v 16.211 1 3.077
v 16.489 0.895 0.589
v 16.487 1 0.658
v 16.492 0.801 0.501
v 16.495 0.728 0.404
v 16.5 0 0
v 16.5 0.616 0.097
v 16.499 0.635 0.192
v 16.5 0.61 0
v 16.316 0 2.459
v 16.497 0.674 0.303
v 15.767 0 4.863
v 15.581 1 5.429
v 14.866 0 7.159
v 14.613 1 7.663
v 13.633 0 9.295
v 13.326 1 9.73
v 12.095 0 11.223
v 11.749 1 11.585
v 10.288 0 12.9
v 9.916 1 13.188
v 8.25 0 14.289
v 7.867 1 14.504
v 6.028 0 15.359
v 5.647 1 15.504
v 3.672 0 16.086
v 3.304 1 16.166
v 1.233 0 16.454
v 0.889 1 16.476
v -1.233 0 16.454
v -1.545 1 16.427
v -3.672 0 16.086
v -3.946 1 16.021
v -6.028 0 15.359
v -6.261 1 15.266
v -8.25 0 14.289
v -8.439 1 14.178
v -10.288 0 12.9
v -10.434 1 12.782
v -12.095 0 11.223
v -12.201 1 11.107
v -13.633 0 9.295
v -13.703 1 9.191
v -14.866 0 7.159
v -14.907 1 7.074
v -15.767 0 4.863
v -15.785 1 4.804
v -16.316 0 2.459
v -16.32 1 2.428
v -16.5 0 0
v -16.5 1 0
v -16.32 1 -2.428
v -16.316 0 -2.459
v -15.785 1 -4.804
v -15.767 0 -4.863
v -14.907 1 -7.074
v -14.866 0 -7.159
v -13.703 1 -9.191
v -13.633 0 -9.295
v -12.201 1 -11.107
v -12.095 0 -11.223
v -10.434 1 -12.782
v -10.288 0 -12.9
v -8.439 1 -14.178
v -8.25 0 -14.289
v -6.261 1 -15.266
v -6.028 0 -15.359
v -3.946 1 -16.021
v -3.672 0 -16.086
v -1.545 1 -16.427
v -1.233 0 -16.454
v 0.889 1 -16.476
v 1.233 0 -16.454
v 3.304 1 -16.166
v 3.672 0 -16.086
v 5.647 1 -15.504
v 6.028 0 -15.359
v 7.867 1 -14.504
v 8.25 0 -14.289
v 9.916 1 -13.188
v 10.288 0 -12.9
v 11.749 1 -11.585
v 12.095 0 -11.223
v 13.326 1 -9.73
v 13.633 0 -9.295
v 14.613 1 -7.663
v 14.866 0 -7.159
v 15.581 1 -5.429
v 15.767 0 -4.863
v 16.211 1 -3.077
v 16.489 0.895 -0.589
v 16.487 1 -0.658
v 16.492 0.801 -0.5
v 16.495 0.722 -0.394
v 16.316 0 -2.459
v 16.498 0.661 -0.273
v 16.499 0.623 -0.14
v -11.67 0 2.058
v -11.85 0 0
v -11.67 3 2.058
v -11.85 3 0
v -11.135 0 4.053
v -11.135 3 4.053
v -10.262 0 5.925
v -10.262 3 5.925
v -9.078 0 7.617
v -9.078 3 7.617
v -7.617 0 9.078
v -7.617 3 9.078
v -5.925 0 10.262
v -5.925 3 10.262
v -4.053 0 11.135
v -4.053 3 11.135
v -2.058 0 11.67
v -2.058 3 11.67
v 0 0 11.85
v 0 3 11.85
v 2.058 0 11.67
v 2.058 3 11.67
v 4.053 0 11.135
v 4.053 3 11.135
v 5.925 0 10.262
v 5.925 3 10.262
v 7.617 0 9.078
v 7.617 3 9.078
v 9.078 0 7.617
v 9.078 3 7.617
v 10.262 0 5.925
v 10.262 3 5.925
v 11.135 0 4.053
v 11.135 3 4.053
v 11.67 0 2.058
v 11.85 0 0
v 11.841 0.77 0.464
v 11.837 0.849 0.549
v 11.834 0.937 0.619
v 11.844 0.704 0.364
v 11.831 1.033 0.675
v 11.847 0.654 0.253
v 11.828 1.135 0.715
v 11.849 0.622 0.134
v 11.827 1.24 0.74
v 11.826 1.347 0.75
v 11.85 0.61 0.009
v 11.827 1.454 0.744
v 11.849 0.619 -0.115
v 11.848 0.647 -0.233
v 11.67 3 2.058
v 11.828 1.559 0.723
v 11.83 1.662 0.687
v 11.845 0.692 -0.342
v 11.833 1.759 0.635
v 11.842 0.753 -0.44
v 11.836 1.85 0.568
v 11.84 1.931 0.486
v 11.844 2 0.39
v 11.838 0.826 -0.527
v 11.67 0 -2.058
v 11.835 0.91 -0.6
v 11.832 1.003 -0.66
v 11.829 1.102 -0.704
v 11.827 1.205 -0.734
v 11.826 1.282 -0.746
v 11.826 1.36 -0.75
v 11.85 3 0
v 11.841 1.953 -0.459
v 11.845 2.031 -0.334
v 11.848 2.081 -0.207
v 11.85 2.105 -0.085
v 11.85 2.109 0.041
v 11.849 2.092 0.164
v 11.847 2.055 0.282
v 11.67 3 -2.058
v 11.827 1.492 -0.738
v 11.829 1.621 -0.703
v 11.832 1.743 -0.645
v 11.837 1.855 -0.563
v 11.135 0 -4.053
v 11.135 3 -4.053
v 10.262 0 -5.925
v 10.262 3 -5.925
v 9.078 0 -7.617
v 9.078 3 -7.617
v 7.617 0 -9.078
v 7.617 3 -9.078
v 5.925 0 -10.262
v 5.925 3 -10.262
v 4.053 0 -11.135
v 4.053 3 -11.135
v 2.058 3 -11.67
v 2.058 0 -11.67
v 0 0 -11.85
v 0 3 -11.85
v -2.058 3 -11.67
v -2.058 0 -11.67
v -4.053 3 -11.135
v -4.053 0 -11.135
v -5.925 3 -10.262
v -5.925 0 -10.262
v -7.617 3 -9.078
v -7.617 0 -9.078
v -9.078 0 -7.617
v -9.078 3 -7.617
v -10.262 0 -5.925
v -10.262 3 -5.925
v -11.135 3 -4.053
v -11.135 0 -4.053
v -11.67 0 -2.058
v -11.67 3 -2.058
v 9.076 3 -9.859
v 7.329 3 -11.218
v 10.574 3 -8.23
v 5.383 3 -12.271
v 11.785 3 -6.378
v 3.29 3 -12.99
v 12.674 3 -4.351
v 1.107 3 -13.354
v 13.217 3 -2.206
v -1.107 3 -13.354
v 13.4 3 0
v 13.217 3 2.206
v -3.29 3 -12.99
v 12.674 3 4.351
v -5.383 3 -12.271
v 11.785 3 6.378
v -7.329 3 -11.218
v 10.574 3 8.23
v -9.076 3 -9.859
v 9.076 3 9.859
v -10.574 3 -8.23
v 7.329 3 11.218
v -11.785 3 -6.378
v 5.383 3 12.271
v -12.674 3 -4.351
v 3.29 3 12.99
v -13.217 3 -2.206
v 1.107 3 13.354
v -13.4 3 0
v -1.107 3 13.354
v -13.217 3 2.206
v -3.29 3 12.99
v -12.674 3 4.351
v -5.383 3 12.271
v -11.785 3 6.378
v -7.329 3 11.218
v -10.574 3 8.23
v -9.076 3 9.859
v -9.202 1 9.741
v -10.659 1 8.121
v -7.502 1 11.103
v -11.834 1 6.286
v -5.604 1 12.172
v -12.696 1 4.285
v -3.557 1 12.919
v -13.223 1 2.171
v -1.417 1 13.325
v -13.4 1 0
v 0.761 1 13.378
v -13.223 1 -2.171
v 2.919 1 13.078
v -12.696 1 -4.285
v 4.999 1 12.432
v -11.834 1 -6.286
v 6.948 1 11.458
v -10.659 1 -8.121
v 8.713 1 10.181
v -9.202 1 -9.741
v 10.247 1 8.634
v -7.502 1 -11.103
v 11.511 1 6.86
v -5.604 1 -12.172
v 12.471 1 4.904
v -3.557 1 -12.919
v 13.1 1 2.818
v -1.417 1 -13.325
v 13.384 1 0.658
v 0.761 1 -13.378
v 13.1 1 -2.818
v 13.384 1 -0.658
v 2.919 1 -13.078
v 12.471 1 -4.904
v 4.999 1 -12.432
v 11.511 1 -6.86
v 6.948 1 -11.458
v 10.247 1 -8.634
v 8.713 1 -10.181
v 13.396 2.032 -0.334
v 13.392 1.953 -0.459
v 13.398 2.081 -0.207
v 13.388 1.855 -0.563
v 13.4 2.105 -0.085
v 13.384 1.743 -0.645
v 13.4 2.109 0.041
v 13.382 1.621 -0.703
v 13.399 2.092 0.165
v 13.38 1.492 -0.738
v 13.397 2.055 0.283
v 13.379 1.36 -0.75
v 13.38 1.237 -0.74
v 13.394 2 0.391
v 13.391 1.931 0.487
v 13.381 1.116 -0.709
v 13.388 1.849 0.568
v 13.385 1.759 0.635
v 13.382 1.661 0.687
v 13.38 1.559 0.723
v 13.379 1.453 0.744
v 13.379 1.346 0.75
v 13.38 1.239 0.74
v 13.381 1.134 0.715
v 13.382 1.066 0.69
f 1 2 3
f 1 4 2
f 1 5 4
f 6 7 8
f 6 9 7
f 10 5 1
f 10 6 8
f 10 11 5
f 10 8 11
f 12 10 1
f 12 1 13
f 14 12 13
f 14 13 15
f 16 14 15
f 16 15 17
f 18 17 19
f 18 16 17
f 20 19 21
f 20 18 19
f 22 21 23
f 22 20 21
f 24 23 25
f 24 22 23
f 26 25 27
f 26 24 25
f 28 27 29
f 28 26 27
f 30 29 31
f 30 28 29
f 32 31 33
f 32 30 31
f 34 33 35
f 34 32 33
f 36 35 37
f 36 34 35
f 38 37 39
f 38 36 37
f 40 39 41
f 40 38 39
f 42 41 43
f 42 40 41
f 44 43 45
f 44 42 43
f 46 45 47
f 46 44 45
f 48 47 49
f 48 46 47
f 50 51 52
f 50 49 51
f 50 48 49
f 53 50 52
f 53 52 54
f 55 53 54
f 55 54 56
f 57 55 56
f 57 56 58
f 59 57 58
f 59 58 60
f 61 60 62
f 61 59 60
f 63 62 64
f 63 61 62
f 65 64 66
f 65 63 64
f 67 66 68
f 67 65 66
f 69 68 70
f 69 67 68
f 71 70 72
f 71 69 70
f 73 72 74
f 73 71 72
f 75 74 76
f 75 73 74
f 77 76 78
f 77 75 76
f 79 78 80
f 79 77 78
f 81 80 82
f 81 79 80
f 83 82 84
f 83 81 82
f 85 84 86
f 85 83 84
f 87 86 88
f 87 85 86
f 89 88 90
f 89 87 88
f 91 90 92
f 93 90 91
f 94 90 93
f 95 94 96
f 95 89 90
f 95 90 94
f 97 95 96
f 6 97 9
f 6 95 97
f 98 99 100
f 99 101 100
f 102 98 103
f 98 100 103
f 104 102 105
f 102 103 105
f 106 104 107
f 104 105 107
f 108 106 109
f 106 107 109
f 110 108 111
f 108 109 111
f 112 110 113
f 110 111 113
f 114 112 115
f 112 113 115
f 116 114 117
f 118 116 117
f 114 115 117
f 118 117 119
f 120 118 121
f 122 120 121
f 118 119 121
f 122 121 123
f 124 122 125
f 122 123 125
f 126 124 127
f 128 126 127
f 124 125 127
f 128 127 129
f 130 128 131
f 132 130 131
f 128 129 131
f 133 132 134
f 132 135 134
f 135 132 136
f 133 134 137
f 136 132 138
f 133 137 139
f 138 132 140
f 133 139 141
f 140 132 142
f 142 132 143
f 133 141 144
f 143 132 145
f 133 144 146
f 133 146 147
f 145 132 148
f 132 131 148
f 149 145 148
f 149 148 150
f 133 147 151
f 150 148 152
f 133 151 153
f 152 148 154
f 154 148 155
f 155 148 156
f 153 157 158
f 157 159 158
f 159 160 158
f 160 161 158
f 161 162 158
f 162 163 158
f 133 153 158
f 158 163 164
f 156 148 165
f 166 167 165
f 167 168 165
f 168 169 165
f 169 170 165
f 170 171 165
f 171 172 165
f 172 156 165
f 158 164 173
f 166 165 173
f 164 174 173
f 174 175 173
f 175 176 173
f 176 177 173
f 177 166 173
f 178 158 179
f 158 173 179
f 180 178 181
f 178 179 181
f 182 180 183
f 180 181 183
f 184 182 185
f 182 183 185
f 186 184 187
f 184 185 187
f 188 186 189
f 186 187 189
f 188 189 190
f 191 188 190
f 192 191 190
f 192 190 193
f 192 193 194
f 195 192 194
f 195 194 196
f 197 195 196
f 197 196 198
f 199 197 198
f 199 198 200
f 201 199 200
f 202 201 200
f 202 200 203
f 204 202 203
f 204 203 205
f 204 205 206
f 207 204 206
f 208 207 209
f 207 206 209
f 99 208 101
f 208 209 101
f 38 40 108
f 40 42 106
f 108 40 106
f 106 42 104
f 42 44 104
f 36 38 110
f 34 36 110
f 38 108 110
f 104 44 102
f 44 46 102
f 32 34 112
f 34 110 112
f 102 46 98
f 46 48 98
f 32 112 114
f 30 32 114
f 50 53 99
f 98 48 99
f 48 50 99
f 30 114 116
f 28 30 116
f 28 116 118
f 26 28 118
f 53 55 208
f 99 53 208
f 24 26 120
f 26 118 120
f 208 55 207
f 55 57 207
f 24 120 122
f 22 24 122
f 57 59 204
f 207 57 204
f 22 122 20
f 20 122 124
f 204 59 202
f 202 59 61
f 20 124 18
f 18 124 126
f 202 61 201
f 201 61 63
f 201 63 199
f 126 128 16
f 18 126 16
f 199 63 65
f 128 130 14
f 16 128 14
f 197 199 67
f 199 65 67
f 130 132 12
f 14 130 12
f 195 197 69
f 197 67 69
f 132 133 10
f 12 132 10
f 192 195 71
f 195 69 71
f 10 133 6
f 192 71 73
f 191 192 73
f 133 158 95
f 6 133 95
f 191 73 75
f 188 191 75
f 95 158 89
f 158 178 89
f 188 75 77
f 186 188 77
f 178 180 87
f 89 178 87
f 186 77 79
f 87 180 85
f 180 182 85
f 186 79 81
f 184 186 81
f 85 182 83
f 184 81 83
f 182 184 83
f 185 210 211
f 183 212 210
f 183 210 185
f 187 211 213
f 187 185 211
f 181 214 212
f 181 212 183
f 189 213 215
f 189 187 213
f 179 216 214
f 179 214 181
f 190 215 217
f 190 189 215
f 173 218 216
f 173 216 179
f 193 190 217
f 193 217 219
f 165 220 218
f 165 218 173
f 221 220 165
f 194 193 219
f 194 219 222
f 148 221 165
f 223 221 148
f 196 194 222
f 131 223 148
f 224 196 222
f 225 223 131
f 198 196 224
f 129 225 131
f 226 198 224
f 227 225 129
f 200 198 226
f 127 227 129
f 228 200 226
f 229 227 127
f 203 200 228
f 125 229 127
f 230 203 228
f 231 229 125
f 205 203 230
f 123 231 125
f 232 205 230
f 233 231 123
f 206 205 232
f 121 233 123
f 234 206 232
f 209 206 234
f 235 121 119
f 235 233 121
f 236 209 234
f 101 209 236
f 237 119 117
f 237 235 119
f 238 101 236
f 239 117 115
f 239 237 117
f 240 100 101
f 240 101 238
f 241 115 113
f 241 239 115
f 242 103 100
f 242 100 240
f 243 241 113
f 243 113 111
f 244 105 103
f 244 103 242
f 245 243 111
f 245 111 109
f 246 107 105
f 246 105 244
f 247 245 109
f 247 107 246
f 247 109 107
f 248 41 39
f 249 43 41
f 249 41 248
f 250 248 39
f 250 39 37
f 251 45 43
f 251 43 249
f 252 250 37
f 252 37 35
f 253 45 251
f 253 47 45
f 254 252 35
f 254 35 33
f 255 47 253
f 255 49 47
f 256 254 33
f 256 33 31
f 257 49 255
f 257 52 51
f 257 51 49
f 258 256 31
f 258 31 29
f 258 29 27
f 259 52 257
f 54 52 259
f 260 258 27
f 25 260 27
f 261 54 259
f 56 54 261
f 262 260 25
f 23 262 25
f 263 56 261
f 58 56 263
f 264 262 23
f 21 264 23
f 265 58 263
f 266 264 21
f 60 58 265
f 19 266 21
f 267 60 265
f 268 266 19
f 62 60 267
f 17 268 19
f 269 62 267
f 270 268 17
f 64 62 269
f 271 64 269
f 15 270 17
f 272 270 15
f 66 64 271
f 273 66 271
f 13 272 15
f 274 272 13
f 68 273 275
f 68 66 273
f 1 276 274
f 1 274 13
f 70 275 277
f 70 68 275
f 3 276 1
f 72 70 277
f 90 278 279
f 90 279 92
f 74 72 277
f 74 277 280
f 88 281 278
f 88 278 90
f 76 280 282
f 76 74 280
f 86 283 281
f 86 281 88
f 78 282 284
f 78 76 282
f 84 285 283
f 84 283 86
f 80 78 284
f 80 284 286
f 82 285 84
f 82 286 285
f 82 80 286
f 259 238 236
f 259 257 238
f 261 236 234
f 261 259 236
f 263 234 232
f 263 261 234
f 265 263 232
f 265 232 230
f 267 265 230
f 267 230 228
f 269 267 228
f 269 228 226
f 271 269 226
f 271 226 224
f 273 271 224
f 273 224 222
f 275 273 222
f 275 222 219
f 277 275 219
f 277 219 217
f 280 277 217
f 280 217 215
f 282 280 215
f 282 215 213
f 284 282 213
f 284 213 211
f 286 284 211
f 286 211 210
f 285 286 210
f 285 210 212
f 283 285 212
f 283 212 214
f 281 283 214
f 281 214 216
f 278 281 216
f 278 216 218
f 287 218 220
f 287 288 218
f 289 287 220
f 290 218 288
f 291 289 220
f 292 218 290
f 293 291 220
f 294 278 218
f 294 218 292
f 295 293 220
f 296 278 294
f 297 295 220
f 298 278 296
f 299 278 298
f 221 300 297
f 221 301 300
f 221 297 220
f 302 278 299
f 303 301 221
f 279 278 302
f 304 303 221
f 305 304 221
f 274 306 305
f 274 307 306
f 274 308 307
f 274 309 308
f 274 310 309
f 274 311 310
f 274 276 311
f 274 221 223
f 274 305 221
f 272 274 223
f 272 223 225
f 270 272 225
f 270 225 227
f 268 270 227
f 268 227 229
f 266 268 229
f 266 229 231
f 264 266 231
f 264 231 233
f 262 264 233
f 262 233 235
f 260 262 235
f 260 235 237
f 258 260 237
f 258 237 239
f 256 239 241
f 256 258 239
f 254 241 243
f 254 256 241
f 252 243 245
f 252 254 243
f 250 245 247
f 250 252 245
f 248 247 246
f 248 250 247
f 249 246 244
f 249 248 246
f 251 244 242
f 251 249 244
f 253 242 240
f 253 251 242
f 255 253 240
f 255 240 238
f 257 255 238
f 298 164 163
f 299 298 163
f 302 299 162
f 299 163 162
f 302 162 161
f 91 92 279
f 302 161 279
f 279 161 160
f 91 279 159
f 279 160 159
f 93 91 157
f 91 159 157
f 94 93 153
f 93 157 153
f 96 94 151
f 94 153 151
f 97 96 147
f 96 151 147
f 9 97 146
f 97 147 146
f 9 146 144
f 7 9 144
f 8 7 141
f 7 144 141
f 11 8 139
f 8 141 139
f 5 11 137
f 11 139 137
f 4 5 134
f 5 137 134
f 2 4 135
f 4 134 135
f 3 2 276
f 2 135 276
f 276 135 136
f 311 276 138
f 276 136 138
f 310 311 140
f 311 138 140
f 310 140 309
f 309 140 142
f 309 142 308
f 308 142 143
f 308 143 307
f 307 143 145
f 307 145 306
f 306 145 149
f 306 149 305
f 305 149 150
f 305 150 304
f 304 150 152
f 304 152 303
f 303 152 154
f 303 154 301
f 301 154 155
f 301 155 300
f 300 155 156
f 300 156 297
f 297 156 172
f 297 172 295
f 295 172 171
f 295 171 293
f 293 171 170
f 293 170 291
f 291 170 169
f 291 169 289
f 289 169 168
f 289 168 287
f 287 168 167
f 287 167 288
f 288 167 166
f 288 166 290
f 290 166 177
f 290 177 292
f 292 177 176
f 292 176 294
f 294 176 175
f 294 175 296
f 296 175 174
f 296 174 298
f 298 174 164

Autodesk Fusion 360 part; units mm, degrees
sketch "Sketch1" plane through (0, 0, 0) normal (0, 1, 0) x (1, 0, 0)
  circle A0 centre (0, 0) radius 16.5
  dimension "d1" = 33
extrude "Extrude1" add sketch "Sketch1" along normal blind 1
sketch "Sketch2" plane through (0, 1, 0) normal (0, 1, 0) x (-1, 0, 0)
  circle A0 centre (0, 0) radius 16.5
  circle A1 centre (0, 0) radius 13.4
  dimension "d4" = 26.8
extrude "Extrude2" add sketch "Sketch2" along normal blind 2 contours A1
sketch "Sketch3" plane through (0, 3, 0) normal (0, 1, 0) x (-1, 0, 0)
  circle A0 centre (0, 0) radius 13.4
  circle A1 centre (0, 0) radius 11.85
  dimension "d7" = 23.7
extrude "Extrude3" cut sketch "Sketch3" against normal through all contours A1
sketch "Sketch5" plane through (0, 0, 0) normal (1, 0, 0) x (0, 0, -1)
  circle A0 centre (0, 1.36) radius 0.75
  line L0 (16.5, 0) -> (-16.5, 0)
  dimension "d11" = 1.5
  dimension "d12" = 1.36
extrude "Extrude4" cut sketch "Sketch5" along normal through all
